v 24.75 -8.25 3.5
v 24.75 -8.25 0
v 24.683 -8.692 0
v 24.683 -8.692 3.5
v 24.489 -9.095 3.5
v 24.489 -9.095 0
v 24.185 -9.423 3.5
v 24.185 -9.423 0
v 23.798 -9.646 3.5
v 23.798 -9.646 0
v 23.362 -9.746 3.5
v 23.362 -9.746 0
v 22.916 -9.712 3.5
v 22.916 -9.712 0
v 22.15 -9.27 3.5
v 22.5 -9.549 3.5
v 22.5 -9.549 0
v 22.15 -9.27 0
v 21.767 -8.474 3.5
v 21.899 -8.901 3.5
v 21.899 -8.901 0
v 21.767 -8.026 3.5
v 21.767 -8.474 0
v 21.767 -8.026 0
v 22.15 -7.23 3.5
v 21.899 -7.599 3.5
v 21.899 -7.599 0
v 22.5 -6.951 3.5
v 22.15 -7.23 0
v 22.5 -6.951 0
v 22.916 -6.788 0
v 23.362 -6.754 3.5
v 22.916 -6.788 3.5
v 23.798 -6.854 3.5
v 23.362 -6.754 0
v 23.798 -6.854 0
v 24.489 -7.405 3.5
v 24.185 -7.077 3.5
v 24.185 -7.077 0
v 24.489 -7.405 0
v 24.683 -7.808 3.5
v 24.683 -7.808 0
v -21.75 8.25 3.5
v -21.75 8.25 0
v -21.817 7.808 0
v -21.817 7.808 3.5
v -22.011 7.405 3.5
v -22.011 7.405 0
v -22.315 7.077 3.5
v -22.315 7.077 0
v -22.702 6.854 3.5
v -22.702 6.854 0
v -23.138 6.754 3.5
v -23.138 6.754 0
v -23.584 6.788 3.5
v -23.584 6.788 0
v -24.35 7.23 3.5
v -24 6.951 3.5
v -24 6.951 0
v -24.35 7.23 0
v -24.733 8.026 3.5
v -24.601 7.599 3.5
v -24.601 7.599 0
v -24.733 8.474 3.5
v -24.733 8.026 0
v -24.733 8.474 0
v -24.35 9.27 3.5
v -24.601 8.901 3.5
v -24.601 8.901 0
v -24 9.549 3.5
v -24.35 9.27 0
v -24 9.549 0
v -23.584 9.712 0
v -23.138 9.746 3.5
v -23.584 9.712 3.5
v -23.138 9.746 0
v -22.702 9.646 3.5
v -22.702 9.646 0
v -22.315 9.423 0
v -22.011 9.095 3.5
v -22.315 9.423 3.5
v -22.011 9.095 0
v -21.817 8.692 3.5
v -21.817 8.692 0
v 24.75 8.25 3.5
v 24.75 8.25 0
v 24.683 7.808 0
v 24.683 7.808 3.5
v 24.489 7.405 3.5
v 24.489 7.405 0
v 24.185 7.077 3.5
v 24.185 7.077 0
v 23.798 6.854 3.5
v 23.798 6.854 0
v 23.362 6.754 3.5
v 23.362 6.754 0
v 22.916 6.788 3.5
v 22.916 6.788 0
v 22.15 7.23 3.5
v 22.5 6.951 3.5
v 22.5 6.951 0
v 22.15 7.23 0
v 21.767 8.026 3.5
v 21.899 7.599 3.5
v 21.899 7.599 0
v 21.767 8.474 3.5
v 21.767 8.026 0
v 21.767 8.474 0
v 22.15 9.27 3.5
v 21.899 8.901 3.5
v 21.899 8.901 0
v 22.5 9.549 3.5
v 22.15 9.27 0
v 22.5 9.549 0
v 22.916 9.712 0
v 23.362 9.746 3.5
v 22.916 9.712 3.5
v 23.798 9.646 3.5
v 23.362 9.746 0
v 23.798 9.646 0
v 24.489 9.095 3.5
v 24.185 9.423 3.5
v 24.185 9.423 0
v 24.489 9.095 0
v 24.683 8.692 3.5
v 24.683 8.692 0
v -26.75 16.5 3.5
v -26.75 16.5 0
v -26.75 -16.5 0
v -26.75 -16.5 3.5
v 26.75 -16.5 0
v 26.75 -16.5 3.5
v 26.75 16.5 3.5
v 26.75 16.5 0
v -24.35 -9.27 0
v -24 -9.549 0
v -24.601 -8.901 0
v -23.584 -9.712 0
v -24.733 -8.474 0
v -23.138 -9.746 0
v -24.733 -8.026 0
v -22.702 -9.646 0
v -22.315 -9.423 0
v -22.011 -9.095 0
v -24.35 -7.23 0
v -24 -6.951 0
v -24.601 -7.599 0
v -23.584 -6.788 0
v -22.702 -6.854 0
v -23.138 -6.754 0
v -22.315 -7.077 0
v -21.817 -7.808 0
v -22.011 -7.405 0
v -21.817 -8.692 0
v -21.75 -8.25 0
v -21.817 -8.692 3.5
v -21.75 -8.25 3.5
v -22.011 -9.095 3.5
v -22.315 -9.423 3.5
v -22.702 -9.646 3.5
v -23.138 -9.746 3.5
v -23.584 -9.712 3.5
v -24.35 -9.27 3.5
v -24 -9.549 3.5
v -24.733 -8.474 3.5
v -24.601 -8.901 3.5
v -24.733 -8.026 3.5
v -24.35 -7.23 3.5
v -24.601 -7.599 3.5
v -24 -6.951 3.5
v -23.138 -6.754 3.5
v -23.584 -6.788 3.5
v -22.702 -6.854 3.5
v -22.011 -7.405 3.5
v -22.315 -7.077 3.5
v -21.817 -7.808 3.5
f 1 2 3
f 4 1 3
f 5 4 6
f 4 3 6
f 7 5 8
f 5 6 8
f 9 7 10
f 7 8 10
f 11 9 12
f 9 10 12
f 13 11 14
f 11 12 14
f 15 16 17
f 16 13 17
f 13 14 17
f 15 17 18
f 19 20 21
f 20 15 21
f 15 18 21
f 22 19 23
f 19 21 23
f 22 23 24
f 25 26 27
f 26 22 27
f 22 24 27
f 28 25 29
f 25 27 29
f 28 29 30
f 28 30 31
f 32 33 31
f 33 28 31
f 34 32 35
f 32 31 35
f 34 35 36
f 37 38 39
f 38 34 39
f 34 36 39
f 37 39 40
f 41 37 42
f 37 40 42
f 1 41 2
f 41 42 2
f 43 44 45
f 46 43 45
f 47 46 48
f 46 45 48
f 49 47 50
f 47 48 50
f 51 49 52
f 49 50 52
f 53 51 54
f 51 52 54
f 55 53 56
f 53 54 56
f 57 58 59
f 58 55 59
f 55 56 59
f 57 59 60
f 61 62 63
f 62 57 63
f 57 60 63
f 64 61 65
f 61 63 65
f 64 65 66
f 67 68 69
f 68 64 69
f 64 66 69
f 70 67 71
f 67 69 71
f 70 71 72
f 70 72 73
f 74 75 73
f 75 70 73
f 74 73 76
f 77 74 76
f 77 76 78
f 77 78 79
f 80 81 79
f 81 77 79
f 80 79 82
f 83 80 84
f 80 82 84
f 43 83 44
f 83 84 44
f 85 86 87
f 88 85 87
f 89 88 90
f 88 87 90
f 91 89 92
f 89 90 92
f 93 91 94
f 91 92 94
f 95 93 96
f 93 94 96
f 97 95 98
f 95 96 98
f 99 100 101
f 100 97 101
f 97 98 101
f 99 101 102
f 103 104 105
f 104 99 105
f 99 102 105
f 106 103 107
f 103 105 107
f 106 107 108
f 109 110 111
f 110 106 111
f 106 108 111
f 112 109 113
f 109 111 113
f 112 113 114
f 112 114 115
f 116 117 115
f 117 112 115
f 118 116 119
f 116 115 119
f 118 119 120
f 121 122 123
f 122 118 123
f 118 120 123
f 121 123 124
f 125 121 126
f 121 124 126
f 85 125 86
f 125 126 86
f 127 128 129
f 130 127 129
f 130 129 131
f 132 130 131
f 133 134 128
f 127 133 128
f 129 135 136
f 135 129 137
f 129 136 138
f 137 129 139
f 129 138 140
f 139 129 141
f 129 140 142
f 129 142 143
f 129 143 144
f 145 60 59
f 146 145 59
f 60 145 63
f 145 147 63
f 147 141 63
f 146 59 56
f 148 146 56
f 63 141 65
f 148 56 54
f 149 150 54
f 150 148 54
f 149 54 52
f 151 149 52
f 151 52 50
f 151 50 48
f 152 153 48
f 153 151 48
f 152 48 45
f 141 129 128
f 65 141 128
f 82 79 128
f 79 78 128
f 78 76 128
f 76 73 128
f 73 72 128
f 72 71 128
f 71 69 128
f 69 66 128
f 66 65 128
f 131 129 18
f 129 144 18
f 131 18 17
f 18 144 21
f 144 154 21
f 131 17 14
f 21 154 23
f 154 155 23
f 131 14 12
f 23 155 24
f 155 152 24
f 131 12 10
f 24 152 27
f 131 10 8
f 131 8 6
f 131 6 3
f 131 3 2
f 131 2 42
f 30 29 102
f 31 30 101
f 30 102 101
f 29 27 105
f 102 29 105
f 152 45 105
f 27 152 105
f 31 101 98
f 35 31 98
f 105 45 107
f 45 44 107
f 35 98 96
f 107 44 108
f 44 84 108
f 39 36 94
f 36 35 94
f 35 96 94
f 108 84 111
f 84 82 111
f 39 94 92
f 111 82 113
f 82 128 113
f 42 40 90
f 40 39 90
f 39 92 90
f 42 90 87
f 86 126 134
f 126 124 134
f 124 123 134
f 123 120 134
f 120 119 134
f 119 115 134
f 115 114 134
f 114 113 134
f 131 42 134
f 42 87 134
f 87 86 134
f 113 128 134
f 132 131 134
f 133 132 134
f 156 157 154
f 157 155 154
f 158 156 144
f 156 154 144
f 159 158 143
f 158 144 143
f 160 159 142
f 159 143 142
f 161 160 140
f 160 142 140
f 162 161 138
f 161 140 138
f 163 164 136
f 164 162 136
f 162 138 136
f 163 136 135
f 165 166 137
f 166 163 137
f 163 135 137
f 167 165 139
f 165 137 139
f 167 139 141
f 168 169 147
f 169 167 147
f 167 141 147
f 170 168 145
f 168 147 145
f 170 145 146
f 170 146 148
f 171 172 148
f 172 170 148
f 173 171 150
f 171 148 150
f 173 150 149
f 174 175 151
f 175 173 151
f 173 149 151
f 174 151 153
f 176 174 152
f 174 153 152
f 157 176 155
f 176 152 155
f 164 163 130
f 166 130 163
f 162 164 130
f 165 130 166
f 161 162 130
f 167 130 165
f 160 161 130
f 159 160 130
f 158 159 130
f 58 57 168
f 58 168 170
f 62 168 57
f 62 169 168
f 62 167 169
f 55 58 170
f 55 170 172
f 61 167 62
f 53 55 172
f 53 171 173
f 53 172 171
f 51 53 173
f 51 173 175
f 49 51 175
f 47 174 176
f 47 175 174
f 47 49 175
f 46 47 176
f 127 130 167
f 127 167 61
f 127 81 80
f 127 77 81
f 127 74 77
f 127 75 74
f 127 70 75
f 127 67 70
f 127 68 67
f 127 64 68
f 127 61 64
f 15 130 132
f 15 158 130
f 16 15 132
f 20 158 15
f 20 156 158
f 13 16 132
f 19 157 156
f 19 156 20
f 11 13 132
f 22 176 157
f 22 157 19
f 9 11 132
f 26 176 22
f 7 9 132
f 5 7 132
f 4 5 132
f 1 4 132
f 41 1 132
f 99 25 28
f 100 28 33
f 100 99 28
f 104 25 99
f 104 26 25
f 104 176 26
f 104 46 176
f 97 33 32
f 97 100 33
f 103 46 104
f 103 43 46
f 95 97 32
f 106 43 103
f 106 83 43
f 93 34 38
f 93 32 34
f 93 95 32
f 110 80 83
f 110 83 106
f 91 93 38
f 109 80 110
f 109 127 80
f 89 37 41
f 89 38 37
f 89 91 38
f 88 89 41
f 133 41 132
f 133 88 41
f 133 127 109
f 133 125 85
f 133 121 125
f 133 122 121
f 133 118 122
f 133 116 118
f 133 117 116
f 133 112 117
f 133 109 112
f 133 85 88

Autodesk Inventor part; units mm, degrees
ref_plane "YZ Plane" through (0, 0, 0) normal (1, 0, 0) x (0, 1, 0)
ref_plane "XZ Plane" through (0, 0, 0) normal (0, 1, 0) x (-1, 0, 0)
ref_plane "XY Plane" through (0, 0, 0) normal (0, 0, 1) x (1, 0, 0)
sketch "Skizze1" plane through (0, 0, 0) normal (0, 0, 1) x (1, 0, 0)
  line L0 (-37.45, 0) -> (37.45, 0) construction
  line L1 (0, -23.1) -> (0, 23.1) construction
  line L2 (-26.75, -16.5) -> (26.75, -16.5)
  line L3 (26.75, -16.5) -> (26.75, 16.5)
  line L4 (26.75, 16.5) -> (-26.75, 16.5)
  line L5 (-26.75, 16.5) -> (-26.75, -16.5)
  line L6 (-26.75, -16.5) -> (26.75, 16.5) construction
  line L7 (26.75, -16.5) -> (-26.75, 16.5) construction
  circle A0 centre (-23.25, -8.25) radius 1.5
  circle A1 centre (23.25, -8.25) radius 1.5
  circle A2 centre (-23.25, 8.25) radius 1.5
  circle A3 centre (23.25, 8.25) radius 1.5
  point P0 (0, 0)
  dimension "d0" = 53.5
  dimension "d1" = 33
  dimension "d4" = 3
  dimension "d7" = 8.25
  dimension "d8" = 23.25
extrude "Extrusion1" add sketch "Skizze1" along normal blind 3.5
properties part number "LC_mirror_holder_back"
